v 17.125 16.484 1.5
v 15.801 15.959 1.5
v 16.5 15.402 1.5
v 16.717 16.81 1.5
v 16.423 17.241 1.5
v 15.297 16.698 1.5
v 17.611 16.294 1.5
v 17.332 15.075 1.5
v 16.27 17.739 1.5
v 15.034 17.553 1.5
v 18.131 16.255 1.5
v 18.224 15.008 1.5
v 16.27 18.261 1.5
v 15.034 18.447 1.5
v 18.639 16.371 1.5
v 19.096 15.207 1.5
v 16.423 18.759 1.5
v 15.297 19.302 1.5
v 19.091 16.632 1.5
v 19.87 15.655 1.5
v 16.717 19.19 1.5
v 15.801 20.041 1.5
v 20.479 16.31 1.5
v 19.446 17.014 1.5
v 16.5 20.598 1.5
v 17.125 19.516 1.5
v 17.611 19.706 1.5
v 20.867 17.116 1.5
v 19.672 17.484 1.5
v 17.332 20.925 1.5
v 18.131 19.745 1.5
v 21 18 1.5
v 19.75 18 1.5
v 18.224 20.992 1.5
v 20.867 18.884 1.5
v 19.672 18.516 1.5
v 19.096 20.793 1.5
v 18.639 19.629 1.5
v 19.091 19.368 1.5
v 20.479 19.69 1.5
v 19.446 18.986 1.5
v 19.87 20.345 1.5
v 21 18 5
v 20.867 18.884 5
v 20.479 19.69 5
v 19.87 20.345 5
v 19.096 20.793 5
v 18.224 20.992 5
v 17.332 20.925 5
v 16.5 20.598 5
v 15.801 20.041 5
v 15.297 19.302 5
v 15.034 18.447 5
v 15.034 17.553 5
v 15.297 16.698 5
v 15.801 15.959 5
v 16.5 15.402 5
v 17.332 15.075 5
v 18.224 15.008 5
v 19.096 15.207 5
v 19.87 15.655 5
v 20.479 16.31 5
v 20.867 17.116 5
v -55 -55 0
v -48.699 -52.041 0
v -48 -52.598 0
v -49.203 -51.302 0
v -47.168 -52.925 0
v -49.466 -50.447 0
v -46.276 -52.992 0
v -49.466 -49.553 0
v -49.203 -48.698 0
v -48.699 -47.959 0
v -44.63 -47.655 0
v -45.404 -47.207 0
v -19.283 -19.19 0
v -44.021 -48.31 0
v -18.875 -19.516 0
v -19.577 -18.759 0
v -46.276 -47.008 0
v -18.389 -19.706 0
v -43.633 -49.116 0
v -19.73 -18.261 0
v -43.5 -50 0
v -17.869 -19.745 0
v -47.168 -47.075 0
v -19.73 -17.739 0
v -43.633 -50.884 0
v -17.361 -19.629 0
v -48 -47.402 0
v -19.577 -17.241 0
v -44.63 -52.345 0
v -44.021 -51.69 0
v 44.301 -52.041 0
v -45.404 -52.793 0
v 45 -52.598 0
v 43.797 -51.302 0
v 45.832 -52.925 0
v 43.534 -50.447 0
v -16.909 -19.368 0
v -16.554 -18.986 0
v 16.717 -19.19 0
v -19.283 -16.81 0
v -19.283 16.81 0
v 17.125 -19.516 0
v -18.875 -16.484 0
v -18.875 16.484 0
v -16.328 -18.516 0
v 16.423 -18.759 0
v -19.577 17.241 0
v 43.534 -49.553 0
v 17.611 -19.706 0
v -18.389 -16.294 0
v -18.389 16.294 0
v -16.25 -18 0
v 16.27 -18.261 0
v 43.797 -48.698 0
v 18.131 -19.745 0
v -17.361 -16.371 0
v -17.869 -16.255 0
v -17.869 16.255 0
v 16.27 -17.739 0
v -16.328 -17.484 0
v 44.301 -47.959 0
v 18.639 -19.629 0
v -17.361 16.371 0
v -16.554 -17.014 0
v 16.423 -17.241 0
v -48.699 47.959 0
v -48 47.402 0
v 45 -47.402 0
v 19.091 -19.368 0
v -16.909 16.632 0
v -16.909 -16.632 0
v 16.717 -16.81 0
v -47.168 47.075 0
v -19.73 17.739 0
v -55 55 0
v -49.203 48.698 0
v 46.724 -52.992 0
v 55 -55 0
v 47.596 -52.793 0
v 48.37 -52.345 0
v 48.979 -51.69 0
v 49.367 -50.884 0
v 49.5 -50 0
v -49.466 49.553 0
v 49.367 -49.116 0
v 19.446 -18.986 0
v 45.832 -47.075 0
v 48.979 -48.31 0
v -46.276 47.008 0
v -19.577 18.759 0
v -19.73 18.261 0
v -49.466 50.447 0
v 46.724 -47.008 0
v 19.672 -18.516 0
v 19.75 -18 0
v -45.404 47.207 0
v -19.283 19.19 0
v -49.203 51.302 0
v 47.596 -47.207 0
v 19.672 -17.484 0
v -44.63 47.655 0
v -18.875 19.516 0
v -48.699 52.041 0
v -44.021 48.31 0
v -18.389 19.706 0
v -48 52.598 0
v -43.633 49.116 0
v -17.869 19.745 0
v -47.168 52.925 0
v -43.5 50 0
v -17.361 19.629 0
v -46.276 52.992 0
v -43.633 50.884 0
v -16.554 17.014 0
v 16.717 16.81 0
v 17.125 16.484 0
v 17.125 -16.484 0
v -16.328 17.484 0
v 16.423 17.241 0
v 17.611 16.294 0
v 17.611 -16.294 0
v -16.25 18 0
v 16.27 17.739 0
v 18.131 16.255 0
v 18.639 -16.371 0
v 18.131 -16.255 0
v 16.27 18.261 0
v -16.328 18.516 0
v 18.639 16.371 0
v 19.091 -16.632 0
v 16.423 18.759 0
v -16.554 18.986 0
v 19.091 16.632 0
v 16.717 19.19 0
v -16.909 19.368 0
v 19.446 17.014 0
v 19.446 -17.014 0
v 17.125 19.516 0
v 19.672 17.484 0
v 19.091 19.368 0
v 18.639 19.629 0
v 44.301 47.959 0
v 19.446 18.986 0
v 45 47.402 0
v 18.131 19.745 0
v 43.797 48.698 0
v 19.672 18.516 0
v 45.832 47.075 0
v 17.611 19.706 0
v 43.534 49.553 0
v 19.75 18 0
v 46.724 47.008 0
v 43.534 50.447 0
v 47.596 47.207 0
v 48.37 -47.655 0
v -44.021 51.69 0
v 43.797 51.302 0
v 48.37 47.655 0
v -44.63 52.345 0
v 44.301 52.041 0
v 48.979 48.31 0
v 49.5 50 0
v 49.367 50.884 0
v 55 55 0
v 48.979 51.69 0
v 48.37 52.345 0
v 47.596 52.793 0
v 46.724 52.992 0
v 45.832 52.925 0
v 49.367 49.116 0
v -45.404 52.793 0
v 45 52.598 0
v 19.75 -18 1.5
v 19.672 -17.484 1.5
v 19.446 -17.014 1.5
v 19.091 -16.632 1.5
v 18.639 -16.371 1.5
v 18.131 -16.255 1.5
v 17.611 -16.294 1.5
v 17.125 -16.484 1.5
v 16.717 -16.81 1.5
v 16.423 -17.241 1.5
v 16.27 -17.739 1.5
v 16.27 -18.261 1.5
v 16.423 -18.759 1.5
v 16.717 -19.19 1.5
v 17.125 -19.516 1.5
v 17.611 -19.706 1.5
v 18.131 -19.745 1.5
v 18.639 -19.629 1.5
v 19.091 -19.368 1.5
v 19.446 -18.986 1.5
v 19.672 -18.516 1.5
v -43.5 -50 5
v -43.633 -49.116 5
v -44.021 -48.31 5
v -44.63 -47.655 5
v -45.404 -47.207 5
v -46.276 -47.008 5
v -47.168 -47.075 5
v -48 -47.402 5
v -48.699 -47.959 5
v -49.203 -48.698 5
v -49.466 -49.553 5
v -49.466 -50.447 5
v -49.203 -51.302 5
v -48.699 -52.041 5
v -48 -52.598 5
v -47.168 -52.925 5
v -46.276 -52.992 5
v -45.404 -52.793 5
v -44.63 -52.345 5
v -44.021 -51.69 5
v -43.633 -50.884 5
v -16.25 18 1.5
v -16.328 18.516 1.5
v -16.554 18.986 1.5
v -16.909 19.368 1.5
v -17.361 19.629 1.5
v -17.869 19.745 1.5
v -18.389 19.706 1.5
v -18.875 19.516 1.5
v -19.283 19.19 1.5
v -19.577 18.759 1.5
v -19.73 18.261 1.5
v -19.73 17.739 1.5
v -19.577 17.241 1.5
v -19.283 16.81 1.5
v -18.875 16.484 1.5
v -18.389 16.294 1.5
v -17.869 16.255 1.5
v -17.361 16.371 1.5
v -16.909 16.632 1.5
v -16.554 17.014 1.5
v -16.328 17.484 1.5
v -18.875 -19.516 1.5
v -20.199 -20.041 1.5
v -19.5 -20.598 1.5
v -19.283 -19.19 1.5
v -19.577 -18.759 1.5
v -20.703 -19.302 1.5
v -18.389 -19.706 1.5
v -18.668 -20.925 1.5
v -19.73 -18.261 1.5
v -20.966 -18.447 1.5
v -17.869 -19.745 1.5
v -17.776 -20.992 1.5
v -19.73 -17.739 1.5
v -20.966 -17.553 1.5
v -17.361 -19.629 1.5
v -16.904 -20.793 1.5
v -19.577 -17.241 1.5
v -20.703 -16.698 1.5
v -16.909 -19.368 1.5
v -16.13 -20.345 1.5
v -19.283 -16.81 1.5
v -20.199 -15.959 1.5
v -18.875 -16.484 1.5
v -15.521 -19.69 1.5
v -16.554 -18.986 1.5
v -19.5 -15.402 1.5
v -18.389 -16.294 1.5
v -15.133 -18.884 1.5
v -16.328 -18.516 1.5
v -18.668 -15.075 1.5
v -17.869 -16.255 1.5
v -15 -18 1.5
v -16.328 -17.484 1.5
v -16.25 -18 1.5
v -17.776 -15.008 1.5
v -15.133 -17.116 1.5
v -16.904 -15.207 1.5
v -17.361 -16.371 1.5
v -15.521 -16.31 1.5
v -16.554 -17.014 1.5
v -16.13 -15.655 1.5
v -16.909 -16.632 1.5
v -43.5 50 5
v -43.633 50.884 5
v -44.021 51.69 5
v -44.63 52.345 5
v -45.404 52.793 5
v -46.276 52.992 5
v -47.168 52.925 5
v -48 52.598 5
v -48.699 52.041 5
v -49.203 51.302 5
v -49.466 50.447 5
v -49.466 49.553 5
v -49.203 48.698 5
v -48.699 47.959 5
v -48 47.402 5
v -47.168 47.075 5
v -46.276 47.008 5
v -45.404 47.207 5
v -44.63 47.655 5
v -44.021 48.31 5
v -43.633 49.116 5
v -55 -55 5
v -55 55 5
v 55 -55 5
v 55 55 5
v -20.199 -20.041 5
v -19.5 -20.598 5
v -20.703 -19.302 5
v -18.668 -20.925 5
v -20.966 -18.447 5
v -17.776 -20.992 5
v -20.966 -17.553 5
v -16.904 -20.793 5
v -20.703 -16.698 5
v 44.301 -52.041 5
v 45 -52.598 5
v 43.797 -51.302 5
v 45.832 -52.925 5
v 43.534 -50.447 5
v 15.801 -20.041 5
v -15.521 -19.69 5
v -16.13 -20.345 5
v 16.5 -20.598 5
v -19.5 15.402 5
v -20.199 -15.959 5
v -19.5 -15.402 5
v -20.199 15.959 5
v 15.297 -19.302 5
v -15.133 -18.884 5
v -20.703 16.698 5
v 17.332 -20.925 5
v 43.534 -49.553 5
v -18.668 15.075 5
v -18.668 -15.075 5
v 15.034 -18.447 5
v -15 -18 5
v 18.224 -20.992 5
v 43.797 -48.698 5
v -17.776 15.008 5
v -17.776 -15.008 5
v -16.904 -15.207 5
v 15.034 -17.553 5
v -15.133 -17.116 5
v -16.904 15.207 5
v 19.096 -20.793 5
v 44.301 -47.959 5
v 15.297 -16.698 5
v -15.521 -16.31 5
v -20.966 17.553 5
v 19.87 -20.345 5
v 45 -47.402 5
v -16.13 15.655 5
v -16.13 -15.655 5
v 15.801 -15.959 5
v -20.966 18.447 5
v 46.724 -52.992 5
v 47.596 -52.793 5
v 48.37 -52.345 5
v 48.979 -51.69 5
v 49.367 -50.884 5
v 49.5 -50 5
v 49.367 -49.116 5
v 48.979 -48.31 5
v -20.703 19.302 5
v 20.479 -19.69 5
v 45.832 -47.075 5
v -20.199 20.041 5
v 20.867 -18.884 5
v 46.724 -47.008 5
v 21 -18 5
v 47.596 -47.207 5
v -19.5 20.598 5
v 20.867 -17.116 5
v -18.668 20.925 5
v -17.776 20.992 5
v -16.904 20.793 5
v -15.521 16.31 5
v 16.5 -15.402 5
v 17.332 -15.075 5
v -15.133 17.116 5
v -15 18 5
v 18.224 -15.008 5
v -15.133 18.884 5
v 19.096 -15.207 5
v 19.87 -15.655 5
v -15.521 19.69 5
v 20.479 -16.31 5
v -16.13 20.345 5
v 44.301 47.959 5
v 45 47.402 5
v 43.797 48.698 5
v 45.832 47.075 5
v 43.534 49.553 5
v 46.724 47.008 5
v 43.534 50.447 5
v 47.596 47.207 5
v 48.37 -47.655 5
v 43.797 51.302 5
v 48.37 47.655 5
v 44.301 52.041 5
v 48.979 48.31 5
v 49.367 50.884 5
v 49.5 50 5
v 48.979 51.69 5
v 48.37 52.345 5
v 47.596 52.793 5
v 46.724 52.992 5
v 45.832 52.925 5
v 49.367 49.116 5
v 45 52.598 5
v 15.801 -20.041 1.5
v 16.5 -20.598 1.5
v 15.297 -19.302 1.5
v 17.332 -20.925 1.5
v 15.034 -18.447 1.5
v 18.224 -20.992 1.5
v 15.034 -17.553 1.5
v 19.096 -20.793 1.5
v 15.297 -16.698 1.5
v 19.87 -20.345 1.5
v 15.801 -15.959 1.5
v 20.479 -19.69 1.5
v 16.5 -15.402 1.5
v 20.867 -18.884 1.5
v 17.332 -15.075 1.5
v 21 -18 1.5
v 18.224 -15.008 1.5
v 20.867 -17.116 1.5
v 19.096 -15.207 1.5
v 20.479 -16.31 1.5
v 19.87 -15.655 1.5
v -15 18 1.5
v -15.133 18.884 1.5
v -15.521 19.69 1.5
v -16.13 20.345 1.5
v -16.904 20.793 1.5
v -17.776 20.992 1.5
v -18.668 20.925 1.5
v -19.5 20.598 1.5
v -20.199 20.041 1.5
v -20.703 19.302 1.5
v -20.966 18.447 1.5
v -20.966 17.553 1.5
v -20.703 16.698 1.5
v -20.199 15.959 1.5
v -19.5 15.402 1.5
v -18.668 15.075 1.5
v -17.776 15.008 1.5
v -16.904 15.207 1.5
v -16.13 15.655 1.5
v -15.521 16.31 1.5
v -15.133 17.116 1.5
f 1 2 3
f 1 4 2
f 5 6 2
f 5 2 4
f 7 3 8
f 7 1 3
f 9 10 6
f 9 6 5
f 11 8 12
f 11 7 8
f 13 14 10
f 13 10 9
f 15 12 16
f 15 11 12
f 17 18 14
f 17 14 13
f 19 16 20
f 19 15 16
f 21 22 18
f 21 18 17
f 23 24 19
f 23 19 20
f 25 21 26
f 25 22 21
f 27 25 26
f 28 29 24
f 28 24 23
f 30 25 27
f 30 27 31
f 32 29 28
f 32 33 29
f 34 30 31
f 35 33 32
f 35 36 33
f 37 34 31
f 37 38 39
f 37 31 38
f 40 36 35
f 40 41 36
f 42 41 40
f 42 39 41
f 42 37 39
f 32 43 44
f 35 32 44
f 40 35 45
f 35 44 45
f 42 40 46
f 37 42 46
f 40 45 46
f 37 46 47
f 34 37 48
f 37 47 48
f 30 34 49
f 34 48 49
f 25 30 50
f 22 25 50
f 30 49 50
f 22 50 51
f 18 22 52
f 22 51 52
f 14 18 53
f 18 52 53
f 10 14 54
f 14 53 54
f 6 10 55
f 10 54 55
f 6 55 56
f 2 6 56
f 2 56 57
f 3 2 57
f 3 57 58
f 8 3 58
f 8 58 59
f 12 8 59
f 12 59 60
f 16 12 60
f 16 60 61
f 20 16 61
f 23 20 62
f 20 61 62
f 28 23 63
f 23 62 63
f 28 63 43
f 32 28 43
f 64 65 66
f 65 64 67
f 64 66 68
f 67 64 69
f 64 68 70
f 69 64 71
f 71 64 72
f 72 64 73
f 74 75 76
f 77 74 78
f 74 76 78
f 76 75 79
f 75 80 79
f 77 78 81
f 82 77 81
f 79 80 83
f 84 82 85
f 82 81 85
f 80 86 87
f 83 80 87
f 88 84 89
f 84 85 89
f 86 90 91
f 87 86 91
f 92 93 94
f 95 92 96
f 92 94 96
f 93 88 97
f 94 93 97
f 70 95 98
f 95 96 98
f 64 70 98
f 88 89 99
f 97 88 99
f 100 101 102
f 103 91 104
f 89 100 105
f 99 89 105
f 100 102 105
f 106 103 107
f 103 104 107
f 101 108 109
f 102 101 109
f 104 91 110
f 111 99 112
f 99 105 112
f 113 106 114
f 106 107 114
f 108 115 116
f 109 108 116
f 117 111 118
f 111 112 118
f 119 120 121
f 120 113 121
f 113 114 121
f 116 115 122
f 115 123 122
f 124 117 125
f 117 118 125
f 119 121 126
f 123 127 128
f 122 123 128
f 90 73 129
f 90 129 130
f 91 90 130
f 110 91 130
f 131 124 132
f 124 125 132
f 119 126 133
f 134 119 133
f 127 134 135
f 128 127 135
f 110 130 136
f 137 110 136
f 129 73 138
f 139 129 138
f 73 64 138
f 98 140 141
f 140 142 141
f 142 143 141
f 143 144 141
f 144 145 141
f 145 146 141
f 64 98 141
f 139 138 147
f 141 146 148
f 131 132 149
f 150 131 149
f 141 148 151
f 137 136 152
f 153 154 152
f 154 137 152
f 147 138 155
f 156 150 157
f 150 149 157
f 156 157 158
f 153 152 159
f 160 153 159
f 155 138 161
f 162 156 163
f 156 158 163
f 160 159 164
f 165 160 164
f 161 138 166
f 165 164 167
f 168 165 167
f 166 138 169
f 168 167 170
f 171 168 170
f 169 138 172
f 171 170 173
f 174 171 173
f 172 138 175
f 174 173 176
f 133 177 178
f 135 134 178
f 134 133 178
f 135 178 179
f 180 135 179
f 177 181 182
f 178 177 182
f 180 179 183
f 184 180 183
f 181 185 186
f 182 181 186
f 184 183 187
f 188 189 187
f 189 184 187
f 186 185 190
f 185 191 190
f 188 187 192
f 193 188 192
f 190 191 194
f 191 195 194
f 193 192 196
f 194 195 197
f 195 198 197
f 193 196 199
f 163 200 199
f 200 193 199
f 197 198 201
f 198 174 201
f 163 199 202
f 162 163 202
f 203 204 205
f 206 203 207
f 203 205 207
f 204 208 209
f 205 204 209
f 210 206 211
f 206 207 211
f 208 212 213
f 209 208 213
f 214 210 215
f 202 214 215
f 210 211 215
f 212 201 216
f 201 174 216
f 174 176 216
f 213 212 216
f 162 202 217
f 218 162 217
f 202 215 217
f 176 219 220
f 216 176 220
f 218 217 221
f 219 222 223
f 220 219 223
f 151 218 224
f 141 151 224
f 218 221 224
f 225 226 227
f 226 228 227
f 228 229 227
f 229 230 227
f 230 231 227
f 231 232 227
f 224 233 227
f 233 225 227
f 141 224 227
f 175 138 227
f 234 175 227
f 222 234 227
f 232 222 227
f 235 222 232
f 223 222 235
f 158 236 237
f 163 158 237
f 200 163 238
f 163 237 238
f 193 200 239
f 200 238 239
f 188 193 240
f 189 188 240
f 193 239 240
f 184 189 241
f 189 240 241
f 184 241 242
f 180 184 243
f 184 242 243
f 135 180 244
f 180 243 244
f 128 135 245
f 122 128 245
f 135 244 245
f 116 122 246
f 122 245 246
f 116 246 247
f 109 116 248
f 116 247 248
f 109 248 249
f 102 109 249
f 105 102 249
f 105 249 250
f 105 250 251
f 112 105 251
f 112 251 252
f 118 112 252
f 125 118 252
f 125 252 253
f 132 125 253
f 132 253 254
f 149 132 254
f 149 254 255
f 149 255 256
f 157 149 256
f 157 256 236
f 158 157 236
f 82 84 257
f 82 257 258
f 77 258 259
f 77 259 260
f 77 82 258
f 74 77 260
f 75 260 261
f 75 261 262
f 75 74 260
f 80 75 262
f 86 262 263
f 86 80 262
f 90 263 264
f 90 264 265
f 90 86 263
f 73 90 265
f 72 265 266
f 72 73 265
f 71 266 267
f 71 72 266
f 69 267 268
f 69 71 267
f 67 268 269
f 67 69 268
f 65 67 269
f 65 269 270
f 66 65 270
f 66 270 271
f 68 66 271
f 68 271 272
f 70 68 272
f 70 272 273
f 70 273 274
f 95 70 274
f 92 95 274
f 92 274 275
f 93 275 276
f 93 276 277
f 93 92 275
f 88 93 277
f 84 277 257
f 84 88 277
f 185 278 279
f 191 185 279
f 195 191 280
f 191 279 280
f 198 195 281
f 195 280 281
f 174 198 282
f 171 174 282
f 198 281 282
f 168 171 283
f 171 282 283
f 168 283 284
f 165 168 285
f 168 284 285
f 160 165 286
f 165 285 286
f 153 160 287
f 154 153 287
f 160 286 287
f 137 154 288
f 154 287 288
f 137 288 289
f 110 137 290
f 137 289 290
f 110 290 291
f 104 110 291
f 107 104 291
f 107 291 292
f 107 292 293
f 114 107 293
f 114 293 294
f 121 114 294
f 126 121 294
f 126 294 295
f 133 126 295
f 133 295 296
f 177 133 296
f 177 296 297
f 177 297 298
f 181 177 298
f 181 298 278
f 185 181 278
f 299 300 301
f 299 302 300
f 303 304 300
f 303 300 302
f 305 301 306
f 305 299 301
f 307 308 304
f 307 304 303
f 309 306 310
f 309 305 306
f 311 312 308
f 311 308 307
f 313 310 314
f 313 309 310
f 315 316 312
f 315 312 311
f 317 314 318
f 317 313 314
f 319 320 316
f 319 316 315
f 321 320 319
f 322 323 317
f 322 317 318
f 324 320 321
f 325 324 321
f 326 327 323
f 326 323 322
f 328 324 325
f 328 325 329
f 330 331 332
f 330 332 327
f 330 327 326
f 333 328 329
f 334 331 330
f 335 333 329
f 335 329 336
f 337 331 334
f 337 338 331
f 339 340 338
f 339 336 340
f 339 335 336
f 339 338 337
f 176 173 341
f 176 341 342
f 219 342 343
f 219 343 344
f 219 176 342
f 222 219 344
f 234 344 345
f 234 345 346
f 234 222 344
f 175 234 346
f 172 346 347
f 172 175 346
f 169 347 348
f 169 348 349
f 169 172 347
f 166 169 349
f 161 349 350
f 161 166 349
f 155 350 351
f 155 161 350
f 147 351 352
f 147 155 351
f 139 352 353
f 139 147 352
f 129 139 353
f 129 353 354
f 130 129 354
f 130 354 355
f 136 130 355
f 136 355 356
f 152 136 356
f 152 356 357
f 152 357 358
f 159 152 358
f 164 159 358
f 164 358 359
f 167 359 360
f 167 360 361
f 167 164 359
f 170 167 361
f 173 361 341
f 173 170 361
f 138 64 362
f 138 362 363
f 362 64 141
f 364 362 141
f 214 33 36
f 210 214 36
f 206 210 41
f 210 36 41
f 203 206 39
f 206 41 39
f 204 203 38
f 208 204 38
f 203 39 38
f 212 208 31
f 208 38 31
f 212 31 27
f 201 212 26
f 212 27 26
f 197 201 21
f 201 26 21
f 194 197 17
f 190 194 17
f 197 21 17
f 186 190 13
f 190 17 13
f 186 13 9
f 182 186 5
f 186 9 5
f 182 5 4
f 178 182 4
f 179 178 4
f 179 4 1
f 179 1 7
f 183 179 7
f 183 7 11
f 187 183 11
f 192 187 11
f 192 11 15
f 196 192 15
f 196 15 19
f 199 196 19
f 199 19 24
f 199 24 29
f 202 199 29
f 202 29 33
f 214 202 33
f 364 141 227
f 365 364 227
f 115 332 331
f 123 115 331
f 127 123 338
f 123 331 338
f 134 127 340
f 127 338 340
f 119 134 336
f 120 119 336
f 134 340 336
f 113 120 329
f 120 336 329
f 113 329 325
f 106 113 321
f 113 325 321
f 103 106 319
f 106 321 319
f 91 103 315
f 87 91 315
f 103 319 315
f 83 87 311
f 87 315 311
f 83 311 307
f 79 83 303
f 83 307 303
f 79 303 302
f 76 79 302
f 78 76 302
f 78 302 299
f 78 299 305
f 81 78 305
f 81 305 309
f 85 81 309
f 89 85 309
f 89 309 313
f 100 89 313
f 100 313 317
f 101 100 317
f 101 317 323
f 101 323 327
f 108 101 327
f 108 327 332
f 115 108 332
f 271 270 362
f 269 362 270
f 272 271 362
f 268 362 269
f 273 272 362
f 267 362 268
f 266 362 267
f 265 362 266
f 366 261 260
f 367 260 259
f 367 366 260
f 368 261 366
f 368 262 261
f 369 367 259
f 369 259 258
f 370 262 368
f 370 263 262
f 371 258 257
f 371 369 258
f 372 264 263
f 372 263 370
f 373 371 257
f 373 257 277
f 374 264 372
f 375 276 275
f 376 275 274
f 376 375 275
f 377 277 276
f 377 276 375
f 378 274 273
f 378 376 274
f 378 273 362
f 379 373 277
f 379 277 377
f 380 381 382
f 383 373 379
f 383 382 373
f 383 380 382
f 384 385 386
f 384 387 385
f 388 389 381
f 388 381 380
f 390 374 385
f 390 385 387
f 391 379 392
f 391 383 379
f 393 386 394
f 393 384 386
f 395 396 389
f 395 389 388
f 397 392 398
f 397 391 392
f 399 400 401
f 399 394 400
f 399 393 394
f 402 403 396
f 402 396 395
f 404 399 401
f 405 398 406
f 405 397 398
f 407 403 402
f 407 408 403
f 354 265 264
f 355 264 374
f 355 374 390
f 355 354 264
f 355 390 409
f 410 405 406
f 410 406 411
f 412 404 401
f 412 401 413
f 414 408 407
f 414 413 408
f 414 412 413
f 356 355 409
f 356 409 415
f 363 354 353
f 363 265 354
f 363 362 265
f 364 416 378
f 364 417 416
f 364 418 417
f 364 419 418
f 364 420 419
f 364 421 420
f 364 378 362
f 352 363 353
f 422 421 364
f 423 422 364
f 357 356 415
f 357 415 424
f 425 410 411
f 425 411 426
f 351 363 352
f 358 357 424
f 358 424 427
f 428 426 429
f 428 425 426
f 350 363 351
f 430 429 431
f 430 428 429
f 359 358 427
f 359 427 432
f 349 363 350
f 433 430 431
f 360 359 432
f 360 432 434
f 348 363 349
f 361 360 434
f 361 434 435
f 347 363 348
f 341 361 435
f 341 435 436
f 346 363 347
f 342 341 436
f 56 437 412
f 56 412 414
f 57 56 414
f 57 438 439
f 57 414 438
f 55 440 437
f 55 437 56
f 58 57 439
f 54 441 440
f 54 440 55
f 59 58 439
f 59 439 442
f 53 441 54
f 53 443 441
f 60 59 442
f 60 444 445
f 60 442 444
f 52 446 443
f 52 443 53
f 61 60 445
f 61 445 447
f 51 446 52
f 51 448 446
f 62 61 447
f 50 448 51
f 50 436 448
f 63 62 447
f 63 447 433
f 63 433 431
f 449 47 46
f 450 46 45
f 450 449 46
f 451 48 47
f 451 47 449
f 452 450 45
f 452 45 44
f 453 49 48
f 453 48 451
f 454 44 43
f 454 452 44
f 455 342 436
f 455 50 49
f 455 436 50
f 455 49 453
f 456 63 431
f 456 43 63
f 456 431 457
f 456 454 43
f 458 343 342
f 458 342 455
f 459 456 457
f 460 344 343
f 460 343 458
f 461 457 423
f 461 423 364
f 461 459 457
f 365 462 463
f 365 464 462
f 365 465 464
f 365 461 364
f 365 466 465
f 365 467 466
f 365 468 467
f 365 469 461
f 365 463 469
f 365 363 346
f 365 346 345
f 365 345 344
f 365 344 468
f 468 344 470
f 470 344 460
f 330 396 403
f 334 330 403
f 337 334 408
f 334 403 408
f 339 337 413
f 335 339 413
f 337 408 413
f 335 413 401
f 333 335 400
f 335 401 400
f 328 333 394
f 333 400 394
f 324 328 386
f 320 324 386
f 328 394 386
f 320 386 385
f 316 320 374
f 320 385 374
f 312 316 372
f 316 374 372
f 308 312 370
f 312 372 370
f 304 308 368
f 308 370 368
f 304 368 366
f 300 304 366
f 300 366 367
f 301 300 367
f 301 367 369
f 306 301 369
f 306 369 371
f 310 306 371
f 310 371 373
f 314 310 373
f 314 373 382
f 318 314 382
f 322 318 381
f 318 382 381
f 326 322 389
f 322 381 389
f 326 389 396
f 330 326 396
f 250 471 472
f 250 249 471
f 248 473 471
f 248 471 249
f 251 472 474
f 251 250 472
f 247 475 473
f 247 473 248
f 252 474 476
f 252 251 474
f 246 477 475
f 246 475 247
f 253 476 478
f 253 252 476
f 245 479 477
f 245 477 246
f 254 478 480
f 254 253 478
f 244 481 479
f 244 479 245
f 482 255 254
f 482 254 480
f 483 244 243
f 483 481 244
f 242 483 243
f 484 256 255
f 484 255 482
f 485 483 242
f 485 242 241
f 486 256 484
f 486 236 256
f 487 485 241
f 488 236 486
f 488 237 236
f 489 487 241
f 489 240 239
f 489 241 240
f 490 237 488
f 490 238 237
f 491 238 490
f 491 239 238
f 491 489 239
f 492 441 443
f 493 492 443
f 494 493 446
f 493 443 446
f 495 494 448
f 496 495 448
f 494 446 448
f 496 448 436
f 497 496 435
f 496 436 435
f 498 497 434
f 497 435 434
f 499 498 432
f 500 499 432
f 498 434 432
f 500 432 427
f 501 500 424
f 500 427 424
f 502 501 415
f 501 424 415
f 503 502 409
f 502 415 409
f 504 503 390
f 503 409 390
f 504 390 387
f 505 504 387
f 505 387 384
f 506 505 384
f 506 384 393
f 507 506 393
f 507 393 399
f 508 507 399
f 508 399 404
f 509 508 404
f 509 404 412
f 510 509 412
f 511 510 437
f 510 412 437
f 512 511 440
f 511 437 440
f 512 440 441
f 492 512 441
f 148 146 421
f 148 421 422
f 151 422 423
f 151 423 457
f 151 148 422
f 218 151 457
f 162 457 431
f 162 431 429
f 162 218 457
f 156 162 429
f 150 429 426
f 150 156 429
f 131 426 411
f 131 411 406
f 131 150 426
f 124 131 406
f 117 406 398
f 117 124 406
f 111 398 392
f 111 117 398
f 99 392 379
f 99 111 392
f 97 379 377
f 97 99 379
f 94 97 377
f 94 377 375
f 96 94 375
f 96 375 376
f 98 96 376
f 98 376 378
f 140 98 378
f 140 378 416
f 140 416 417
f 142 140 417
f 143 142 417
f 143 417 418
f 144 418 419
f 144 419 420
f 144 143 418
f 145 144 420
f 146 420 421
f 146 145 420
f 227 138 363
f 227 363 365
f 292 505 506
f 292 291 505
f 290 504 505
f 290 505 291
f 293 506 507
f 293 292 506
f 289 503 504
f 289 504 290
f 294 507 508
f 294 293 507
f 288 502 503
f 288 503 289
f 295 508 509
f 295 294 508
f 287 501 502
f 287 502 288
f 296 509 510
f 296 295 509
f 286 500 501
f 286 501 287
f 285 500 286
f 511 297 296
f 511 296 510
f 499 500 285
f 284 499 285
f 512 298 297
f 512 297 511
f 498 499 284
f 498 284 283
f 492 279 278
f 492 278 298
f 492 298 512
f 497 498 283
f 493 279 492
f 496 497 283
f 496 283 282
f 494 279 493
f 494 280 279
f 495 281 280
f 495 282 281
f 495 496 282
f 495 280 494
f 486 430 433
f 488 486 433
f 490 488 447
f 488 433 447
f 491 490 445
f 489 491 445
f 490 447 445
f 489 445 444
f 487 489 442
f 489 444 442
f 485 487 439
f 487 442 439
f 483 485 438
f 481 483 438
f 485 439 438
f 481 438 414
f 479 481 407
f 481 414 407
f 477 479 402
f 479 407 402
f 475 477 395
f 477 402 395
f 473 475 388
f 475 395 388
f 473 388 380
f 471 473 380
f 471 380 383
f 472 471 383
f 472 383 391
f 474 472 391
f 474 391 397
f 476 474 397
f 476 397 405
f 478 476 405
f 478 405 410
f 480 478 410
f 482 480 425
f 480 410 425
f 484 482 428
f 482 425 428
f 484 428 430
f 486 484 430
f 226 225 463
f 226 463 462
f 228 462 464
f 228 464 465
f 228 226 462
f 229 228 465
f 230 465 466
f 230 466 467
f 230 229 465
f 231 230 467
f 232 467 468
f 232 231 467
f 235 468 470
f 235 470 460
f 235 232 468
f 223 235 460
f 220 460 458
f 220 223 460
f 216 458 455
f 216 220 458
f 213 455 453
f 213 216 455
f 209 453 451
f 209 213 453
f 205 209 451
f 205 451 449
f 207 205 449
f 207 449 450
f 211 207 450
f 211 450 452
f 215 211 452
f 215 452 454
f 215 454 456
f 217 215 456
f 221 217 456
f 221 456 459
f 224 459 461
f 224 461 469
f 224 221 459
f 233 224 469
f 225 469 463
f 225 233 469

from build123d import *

# Parameters (mm, degrees)
F0_W     = 110
F0_H     = 110
F0_R     = 3
F1_DEPTH = 5
F2_R     = 1.75
F3_DEPTH = 5.001
F4_R     = 3
F5_DEPTH = 3.5


with BuildPart() as f1:
    # F0 (on Top) → F1 (new body)
    with BuildSketch(Plane.XY):
        Rectangle(F0_W, F0_H)
        with Locations((-46.5, -50)):
            Circle(F0_R, mode=Mode.SUBTRACT)
        with Locations((46.5, -50)):
            Circle(F0_R, mode=Mode.SUBTRACT)
        with Locations((-46.5, 50)):
            Circle(F0_R, mode=Mode.SUBTRACT)
        with Locations((46.5, 50)):
            Circle(F0_R, mode=Mode.SUBTRACT)
    extrude(amount=F1_DEPTH)

    # F2 (on face) → F3 (cut, through all)
    with BuildSketch(Plane.XY.offset(5)):
        with Locations((-18, 18)):
            Circle(F2_R)
        with Locations((18, 18)):
            Circle(F2_R)
        with Locations((-18, -18)):
            Circle(F2_R)
        with Locations((18, -18)):
            Circle(F2_R)
    extrude(amount=-F3_DEPTH, mode=Mode.SUBTRACT)

    # F4 (on face) → F5 (cut)
    with BuildSketch(Plane.XY.offset(5)):
        with Locations((-18, 18)):
            Circle(F4_R)
        with Locations((-18, -18)):
            Circle(F4_R)
        with Locations((18, 18)):
            Circle(F4_R)
        with Locations((18, -18)):
            Circle(F4_R)
    extrude(amount=-F5_DEPTH, mode=Mode.SUBTRACT)


solid = f1.part
